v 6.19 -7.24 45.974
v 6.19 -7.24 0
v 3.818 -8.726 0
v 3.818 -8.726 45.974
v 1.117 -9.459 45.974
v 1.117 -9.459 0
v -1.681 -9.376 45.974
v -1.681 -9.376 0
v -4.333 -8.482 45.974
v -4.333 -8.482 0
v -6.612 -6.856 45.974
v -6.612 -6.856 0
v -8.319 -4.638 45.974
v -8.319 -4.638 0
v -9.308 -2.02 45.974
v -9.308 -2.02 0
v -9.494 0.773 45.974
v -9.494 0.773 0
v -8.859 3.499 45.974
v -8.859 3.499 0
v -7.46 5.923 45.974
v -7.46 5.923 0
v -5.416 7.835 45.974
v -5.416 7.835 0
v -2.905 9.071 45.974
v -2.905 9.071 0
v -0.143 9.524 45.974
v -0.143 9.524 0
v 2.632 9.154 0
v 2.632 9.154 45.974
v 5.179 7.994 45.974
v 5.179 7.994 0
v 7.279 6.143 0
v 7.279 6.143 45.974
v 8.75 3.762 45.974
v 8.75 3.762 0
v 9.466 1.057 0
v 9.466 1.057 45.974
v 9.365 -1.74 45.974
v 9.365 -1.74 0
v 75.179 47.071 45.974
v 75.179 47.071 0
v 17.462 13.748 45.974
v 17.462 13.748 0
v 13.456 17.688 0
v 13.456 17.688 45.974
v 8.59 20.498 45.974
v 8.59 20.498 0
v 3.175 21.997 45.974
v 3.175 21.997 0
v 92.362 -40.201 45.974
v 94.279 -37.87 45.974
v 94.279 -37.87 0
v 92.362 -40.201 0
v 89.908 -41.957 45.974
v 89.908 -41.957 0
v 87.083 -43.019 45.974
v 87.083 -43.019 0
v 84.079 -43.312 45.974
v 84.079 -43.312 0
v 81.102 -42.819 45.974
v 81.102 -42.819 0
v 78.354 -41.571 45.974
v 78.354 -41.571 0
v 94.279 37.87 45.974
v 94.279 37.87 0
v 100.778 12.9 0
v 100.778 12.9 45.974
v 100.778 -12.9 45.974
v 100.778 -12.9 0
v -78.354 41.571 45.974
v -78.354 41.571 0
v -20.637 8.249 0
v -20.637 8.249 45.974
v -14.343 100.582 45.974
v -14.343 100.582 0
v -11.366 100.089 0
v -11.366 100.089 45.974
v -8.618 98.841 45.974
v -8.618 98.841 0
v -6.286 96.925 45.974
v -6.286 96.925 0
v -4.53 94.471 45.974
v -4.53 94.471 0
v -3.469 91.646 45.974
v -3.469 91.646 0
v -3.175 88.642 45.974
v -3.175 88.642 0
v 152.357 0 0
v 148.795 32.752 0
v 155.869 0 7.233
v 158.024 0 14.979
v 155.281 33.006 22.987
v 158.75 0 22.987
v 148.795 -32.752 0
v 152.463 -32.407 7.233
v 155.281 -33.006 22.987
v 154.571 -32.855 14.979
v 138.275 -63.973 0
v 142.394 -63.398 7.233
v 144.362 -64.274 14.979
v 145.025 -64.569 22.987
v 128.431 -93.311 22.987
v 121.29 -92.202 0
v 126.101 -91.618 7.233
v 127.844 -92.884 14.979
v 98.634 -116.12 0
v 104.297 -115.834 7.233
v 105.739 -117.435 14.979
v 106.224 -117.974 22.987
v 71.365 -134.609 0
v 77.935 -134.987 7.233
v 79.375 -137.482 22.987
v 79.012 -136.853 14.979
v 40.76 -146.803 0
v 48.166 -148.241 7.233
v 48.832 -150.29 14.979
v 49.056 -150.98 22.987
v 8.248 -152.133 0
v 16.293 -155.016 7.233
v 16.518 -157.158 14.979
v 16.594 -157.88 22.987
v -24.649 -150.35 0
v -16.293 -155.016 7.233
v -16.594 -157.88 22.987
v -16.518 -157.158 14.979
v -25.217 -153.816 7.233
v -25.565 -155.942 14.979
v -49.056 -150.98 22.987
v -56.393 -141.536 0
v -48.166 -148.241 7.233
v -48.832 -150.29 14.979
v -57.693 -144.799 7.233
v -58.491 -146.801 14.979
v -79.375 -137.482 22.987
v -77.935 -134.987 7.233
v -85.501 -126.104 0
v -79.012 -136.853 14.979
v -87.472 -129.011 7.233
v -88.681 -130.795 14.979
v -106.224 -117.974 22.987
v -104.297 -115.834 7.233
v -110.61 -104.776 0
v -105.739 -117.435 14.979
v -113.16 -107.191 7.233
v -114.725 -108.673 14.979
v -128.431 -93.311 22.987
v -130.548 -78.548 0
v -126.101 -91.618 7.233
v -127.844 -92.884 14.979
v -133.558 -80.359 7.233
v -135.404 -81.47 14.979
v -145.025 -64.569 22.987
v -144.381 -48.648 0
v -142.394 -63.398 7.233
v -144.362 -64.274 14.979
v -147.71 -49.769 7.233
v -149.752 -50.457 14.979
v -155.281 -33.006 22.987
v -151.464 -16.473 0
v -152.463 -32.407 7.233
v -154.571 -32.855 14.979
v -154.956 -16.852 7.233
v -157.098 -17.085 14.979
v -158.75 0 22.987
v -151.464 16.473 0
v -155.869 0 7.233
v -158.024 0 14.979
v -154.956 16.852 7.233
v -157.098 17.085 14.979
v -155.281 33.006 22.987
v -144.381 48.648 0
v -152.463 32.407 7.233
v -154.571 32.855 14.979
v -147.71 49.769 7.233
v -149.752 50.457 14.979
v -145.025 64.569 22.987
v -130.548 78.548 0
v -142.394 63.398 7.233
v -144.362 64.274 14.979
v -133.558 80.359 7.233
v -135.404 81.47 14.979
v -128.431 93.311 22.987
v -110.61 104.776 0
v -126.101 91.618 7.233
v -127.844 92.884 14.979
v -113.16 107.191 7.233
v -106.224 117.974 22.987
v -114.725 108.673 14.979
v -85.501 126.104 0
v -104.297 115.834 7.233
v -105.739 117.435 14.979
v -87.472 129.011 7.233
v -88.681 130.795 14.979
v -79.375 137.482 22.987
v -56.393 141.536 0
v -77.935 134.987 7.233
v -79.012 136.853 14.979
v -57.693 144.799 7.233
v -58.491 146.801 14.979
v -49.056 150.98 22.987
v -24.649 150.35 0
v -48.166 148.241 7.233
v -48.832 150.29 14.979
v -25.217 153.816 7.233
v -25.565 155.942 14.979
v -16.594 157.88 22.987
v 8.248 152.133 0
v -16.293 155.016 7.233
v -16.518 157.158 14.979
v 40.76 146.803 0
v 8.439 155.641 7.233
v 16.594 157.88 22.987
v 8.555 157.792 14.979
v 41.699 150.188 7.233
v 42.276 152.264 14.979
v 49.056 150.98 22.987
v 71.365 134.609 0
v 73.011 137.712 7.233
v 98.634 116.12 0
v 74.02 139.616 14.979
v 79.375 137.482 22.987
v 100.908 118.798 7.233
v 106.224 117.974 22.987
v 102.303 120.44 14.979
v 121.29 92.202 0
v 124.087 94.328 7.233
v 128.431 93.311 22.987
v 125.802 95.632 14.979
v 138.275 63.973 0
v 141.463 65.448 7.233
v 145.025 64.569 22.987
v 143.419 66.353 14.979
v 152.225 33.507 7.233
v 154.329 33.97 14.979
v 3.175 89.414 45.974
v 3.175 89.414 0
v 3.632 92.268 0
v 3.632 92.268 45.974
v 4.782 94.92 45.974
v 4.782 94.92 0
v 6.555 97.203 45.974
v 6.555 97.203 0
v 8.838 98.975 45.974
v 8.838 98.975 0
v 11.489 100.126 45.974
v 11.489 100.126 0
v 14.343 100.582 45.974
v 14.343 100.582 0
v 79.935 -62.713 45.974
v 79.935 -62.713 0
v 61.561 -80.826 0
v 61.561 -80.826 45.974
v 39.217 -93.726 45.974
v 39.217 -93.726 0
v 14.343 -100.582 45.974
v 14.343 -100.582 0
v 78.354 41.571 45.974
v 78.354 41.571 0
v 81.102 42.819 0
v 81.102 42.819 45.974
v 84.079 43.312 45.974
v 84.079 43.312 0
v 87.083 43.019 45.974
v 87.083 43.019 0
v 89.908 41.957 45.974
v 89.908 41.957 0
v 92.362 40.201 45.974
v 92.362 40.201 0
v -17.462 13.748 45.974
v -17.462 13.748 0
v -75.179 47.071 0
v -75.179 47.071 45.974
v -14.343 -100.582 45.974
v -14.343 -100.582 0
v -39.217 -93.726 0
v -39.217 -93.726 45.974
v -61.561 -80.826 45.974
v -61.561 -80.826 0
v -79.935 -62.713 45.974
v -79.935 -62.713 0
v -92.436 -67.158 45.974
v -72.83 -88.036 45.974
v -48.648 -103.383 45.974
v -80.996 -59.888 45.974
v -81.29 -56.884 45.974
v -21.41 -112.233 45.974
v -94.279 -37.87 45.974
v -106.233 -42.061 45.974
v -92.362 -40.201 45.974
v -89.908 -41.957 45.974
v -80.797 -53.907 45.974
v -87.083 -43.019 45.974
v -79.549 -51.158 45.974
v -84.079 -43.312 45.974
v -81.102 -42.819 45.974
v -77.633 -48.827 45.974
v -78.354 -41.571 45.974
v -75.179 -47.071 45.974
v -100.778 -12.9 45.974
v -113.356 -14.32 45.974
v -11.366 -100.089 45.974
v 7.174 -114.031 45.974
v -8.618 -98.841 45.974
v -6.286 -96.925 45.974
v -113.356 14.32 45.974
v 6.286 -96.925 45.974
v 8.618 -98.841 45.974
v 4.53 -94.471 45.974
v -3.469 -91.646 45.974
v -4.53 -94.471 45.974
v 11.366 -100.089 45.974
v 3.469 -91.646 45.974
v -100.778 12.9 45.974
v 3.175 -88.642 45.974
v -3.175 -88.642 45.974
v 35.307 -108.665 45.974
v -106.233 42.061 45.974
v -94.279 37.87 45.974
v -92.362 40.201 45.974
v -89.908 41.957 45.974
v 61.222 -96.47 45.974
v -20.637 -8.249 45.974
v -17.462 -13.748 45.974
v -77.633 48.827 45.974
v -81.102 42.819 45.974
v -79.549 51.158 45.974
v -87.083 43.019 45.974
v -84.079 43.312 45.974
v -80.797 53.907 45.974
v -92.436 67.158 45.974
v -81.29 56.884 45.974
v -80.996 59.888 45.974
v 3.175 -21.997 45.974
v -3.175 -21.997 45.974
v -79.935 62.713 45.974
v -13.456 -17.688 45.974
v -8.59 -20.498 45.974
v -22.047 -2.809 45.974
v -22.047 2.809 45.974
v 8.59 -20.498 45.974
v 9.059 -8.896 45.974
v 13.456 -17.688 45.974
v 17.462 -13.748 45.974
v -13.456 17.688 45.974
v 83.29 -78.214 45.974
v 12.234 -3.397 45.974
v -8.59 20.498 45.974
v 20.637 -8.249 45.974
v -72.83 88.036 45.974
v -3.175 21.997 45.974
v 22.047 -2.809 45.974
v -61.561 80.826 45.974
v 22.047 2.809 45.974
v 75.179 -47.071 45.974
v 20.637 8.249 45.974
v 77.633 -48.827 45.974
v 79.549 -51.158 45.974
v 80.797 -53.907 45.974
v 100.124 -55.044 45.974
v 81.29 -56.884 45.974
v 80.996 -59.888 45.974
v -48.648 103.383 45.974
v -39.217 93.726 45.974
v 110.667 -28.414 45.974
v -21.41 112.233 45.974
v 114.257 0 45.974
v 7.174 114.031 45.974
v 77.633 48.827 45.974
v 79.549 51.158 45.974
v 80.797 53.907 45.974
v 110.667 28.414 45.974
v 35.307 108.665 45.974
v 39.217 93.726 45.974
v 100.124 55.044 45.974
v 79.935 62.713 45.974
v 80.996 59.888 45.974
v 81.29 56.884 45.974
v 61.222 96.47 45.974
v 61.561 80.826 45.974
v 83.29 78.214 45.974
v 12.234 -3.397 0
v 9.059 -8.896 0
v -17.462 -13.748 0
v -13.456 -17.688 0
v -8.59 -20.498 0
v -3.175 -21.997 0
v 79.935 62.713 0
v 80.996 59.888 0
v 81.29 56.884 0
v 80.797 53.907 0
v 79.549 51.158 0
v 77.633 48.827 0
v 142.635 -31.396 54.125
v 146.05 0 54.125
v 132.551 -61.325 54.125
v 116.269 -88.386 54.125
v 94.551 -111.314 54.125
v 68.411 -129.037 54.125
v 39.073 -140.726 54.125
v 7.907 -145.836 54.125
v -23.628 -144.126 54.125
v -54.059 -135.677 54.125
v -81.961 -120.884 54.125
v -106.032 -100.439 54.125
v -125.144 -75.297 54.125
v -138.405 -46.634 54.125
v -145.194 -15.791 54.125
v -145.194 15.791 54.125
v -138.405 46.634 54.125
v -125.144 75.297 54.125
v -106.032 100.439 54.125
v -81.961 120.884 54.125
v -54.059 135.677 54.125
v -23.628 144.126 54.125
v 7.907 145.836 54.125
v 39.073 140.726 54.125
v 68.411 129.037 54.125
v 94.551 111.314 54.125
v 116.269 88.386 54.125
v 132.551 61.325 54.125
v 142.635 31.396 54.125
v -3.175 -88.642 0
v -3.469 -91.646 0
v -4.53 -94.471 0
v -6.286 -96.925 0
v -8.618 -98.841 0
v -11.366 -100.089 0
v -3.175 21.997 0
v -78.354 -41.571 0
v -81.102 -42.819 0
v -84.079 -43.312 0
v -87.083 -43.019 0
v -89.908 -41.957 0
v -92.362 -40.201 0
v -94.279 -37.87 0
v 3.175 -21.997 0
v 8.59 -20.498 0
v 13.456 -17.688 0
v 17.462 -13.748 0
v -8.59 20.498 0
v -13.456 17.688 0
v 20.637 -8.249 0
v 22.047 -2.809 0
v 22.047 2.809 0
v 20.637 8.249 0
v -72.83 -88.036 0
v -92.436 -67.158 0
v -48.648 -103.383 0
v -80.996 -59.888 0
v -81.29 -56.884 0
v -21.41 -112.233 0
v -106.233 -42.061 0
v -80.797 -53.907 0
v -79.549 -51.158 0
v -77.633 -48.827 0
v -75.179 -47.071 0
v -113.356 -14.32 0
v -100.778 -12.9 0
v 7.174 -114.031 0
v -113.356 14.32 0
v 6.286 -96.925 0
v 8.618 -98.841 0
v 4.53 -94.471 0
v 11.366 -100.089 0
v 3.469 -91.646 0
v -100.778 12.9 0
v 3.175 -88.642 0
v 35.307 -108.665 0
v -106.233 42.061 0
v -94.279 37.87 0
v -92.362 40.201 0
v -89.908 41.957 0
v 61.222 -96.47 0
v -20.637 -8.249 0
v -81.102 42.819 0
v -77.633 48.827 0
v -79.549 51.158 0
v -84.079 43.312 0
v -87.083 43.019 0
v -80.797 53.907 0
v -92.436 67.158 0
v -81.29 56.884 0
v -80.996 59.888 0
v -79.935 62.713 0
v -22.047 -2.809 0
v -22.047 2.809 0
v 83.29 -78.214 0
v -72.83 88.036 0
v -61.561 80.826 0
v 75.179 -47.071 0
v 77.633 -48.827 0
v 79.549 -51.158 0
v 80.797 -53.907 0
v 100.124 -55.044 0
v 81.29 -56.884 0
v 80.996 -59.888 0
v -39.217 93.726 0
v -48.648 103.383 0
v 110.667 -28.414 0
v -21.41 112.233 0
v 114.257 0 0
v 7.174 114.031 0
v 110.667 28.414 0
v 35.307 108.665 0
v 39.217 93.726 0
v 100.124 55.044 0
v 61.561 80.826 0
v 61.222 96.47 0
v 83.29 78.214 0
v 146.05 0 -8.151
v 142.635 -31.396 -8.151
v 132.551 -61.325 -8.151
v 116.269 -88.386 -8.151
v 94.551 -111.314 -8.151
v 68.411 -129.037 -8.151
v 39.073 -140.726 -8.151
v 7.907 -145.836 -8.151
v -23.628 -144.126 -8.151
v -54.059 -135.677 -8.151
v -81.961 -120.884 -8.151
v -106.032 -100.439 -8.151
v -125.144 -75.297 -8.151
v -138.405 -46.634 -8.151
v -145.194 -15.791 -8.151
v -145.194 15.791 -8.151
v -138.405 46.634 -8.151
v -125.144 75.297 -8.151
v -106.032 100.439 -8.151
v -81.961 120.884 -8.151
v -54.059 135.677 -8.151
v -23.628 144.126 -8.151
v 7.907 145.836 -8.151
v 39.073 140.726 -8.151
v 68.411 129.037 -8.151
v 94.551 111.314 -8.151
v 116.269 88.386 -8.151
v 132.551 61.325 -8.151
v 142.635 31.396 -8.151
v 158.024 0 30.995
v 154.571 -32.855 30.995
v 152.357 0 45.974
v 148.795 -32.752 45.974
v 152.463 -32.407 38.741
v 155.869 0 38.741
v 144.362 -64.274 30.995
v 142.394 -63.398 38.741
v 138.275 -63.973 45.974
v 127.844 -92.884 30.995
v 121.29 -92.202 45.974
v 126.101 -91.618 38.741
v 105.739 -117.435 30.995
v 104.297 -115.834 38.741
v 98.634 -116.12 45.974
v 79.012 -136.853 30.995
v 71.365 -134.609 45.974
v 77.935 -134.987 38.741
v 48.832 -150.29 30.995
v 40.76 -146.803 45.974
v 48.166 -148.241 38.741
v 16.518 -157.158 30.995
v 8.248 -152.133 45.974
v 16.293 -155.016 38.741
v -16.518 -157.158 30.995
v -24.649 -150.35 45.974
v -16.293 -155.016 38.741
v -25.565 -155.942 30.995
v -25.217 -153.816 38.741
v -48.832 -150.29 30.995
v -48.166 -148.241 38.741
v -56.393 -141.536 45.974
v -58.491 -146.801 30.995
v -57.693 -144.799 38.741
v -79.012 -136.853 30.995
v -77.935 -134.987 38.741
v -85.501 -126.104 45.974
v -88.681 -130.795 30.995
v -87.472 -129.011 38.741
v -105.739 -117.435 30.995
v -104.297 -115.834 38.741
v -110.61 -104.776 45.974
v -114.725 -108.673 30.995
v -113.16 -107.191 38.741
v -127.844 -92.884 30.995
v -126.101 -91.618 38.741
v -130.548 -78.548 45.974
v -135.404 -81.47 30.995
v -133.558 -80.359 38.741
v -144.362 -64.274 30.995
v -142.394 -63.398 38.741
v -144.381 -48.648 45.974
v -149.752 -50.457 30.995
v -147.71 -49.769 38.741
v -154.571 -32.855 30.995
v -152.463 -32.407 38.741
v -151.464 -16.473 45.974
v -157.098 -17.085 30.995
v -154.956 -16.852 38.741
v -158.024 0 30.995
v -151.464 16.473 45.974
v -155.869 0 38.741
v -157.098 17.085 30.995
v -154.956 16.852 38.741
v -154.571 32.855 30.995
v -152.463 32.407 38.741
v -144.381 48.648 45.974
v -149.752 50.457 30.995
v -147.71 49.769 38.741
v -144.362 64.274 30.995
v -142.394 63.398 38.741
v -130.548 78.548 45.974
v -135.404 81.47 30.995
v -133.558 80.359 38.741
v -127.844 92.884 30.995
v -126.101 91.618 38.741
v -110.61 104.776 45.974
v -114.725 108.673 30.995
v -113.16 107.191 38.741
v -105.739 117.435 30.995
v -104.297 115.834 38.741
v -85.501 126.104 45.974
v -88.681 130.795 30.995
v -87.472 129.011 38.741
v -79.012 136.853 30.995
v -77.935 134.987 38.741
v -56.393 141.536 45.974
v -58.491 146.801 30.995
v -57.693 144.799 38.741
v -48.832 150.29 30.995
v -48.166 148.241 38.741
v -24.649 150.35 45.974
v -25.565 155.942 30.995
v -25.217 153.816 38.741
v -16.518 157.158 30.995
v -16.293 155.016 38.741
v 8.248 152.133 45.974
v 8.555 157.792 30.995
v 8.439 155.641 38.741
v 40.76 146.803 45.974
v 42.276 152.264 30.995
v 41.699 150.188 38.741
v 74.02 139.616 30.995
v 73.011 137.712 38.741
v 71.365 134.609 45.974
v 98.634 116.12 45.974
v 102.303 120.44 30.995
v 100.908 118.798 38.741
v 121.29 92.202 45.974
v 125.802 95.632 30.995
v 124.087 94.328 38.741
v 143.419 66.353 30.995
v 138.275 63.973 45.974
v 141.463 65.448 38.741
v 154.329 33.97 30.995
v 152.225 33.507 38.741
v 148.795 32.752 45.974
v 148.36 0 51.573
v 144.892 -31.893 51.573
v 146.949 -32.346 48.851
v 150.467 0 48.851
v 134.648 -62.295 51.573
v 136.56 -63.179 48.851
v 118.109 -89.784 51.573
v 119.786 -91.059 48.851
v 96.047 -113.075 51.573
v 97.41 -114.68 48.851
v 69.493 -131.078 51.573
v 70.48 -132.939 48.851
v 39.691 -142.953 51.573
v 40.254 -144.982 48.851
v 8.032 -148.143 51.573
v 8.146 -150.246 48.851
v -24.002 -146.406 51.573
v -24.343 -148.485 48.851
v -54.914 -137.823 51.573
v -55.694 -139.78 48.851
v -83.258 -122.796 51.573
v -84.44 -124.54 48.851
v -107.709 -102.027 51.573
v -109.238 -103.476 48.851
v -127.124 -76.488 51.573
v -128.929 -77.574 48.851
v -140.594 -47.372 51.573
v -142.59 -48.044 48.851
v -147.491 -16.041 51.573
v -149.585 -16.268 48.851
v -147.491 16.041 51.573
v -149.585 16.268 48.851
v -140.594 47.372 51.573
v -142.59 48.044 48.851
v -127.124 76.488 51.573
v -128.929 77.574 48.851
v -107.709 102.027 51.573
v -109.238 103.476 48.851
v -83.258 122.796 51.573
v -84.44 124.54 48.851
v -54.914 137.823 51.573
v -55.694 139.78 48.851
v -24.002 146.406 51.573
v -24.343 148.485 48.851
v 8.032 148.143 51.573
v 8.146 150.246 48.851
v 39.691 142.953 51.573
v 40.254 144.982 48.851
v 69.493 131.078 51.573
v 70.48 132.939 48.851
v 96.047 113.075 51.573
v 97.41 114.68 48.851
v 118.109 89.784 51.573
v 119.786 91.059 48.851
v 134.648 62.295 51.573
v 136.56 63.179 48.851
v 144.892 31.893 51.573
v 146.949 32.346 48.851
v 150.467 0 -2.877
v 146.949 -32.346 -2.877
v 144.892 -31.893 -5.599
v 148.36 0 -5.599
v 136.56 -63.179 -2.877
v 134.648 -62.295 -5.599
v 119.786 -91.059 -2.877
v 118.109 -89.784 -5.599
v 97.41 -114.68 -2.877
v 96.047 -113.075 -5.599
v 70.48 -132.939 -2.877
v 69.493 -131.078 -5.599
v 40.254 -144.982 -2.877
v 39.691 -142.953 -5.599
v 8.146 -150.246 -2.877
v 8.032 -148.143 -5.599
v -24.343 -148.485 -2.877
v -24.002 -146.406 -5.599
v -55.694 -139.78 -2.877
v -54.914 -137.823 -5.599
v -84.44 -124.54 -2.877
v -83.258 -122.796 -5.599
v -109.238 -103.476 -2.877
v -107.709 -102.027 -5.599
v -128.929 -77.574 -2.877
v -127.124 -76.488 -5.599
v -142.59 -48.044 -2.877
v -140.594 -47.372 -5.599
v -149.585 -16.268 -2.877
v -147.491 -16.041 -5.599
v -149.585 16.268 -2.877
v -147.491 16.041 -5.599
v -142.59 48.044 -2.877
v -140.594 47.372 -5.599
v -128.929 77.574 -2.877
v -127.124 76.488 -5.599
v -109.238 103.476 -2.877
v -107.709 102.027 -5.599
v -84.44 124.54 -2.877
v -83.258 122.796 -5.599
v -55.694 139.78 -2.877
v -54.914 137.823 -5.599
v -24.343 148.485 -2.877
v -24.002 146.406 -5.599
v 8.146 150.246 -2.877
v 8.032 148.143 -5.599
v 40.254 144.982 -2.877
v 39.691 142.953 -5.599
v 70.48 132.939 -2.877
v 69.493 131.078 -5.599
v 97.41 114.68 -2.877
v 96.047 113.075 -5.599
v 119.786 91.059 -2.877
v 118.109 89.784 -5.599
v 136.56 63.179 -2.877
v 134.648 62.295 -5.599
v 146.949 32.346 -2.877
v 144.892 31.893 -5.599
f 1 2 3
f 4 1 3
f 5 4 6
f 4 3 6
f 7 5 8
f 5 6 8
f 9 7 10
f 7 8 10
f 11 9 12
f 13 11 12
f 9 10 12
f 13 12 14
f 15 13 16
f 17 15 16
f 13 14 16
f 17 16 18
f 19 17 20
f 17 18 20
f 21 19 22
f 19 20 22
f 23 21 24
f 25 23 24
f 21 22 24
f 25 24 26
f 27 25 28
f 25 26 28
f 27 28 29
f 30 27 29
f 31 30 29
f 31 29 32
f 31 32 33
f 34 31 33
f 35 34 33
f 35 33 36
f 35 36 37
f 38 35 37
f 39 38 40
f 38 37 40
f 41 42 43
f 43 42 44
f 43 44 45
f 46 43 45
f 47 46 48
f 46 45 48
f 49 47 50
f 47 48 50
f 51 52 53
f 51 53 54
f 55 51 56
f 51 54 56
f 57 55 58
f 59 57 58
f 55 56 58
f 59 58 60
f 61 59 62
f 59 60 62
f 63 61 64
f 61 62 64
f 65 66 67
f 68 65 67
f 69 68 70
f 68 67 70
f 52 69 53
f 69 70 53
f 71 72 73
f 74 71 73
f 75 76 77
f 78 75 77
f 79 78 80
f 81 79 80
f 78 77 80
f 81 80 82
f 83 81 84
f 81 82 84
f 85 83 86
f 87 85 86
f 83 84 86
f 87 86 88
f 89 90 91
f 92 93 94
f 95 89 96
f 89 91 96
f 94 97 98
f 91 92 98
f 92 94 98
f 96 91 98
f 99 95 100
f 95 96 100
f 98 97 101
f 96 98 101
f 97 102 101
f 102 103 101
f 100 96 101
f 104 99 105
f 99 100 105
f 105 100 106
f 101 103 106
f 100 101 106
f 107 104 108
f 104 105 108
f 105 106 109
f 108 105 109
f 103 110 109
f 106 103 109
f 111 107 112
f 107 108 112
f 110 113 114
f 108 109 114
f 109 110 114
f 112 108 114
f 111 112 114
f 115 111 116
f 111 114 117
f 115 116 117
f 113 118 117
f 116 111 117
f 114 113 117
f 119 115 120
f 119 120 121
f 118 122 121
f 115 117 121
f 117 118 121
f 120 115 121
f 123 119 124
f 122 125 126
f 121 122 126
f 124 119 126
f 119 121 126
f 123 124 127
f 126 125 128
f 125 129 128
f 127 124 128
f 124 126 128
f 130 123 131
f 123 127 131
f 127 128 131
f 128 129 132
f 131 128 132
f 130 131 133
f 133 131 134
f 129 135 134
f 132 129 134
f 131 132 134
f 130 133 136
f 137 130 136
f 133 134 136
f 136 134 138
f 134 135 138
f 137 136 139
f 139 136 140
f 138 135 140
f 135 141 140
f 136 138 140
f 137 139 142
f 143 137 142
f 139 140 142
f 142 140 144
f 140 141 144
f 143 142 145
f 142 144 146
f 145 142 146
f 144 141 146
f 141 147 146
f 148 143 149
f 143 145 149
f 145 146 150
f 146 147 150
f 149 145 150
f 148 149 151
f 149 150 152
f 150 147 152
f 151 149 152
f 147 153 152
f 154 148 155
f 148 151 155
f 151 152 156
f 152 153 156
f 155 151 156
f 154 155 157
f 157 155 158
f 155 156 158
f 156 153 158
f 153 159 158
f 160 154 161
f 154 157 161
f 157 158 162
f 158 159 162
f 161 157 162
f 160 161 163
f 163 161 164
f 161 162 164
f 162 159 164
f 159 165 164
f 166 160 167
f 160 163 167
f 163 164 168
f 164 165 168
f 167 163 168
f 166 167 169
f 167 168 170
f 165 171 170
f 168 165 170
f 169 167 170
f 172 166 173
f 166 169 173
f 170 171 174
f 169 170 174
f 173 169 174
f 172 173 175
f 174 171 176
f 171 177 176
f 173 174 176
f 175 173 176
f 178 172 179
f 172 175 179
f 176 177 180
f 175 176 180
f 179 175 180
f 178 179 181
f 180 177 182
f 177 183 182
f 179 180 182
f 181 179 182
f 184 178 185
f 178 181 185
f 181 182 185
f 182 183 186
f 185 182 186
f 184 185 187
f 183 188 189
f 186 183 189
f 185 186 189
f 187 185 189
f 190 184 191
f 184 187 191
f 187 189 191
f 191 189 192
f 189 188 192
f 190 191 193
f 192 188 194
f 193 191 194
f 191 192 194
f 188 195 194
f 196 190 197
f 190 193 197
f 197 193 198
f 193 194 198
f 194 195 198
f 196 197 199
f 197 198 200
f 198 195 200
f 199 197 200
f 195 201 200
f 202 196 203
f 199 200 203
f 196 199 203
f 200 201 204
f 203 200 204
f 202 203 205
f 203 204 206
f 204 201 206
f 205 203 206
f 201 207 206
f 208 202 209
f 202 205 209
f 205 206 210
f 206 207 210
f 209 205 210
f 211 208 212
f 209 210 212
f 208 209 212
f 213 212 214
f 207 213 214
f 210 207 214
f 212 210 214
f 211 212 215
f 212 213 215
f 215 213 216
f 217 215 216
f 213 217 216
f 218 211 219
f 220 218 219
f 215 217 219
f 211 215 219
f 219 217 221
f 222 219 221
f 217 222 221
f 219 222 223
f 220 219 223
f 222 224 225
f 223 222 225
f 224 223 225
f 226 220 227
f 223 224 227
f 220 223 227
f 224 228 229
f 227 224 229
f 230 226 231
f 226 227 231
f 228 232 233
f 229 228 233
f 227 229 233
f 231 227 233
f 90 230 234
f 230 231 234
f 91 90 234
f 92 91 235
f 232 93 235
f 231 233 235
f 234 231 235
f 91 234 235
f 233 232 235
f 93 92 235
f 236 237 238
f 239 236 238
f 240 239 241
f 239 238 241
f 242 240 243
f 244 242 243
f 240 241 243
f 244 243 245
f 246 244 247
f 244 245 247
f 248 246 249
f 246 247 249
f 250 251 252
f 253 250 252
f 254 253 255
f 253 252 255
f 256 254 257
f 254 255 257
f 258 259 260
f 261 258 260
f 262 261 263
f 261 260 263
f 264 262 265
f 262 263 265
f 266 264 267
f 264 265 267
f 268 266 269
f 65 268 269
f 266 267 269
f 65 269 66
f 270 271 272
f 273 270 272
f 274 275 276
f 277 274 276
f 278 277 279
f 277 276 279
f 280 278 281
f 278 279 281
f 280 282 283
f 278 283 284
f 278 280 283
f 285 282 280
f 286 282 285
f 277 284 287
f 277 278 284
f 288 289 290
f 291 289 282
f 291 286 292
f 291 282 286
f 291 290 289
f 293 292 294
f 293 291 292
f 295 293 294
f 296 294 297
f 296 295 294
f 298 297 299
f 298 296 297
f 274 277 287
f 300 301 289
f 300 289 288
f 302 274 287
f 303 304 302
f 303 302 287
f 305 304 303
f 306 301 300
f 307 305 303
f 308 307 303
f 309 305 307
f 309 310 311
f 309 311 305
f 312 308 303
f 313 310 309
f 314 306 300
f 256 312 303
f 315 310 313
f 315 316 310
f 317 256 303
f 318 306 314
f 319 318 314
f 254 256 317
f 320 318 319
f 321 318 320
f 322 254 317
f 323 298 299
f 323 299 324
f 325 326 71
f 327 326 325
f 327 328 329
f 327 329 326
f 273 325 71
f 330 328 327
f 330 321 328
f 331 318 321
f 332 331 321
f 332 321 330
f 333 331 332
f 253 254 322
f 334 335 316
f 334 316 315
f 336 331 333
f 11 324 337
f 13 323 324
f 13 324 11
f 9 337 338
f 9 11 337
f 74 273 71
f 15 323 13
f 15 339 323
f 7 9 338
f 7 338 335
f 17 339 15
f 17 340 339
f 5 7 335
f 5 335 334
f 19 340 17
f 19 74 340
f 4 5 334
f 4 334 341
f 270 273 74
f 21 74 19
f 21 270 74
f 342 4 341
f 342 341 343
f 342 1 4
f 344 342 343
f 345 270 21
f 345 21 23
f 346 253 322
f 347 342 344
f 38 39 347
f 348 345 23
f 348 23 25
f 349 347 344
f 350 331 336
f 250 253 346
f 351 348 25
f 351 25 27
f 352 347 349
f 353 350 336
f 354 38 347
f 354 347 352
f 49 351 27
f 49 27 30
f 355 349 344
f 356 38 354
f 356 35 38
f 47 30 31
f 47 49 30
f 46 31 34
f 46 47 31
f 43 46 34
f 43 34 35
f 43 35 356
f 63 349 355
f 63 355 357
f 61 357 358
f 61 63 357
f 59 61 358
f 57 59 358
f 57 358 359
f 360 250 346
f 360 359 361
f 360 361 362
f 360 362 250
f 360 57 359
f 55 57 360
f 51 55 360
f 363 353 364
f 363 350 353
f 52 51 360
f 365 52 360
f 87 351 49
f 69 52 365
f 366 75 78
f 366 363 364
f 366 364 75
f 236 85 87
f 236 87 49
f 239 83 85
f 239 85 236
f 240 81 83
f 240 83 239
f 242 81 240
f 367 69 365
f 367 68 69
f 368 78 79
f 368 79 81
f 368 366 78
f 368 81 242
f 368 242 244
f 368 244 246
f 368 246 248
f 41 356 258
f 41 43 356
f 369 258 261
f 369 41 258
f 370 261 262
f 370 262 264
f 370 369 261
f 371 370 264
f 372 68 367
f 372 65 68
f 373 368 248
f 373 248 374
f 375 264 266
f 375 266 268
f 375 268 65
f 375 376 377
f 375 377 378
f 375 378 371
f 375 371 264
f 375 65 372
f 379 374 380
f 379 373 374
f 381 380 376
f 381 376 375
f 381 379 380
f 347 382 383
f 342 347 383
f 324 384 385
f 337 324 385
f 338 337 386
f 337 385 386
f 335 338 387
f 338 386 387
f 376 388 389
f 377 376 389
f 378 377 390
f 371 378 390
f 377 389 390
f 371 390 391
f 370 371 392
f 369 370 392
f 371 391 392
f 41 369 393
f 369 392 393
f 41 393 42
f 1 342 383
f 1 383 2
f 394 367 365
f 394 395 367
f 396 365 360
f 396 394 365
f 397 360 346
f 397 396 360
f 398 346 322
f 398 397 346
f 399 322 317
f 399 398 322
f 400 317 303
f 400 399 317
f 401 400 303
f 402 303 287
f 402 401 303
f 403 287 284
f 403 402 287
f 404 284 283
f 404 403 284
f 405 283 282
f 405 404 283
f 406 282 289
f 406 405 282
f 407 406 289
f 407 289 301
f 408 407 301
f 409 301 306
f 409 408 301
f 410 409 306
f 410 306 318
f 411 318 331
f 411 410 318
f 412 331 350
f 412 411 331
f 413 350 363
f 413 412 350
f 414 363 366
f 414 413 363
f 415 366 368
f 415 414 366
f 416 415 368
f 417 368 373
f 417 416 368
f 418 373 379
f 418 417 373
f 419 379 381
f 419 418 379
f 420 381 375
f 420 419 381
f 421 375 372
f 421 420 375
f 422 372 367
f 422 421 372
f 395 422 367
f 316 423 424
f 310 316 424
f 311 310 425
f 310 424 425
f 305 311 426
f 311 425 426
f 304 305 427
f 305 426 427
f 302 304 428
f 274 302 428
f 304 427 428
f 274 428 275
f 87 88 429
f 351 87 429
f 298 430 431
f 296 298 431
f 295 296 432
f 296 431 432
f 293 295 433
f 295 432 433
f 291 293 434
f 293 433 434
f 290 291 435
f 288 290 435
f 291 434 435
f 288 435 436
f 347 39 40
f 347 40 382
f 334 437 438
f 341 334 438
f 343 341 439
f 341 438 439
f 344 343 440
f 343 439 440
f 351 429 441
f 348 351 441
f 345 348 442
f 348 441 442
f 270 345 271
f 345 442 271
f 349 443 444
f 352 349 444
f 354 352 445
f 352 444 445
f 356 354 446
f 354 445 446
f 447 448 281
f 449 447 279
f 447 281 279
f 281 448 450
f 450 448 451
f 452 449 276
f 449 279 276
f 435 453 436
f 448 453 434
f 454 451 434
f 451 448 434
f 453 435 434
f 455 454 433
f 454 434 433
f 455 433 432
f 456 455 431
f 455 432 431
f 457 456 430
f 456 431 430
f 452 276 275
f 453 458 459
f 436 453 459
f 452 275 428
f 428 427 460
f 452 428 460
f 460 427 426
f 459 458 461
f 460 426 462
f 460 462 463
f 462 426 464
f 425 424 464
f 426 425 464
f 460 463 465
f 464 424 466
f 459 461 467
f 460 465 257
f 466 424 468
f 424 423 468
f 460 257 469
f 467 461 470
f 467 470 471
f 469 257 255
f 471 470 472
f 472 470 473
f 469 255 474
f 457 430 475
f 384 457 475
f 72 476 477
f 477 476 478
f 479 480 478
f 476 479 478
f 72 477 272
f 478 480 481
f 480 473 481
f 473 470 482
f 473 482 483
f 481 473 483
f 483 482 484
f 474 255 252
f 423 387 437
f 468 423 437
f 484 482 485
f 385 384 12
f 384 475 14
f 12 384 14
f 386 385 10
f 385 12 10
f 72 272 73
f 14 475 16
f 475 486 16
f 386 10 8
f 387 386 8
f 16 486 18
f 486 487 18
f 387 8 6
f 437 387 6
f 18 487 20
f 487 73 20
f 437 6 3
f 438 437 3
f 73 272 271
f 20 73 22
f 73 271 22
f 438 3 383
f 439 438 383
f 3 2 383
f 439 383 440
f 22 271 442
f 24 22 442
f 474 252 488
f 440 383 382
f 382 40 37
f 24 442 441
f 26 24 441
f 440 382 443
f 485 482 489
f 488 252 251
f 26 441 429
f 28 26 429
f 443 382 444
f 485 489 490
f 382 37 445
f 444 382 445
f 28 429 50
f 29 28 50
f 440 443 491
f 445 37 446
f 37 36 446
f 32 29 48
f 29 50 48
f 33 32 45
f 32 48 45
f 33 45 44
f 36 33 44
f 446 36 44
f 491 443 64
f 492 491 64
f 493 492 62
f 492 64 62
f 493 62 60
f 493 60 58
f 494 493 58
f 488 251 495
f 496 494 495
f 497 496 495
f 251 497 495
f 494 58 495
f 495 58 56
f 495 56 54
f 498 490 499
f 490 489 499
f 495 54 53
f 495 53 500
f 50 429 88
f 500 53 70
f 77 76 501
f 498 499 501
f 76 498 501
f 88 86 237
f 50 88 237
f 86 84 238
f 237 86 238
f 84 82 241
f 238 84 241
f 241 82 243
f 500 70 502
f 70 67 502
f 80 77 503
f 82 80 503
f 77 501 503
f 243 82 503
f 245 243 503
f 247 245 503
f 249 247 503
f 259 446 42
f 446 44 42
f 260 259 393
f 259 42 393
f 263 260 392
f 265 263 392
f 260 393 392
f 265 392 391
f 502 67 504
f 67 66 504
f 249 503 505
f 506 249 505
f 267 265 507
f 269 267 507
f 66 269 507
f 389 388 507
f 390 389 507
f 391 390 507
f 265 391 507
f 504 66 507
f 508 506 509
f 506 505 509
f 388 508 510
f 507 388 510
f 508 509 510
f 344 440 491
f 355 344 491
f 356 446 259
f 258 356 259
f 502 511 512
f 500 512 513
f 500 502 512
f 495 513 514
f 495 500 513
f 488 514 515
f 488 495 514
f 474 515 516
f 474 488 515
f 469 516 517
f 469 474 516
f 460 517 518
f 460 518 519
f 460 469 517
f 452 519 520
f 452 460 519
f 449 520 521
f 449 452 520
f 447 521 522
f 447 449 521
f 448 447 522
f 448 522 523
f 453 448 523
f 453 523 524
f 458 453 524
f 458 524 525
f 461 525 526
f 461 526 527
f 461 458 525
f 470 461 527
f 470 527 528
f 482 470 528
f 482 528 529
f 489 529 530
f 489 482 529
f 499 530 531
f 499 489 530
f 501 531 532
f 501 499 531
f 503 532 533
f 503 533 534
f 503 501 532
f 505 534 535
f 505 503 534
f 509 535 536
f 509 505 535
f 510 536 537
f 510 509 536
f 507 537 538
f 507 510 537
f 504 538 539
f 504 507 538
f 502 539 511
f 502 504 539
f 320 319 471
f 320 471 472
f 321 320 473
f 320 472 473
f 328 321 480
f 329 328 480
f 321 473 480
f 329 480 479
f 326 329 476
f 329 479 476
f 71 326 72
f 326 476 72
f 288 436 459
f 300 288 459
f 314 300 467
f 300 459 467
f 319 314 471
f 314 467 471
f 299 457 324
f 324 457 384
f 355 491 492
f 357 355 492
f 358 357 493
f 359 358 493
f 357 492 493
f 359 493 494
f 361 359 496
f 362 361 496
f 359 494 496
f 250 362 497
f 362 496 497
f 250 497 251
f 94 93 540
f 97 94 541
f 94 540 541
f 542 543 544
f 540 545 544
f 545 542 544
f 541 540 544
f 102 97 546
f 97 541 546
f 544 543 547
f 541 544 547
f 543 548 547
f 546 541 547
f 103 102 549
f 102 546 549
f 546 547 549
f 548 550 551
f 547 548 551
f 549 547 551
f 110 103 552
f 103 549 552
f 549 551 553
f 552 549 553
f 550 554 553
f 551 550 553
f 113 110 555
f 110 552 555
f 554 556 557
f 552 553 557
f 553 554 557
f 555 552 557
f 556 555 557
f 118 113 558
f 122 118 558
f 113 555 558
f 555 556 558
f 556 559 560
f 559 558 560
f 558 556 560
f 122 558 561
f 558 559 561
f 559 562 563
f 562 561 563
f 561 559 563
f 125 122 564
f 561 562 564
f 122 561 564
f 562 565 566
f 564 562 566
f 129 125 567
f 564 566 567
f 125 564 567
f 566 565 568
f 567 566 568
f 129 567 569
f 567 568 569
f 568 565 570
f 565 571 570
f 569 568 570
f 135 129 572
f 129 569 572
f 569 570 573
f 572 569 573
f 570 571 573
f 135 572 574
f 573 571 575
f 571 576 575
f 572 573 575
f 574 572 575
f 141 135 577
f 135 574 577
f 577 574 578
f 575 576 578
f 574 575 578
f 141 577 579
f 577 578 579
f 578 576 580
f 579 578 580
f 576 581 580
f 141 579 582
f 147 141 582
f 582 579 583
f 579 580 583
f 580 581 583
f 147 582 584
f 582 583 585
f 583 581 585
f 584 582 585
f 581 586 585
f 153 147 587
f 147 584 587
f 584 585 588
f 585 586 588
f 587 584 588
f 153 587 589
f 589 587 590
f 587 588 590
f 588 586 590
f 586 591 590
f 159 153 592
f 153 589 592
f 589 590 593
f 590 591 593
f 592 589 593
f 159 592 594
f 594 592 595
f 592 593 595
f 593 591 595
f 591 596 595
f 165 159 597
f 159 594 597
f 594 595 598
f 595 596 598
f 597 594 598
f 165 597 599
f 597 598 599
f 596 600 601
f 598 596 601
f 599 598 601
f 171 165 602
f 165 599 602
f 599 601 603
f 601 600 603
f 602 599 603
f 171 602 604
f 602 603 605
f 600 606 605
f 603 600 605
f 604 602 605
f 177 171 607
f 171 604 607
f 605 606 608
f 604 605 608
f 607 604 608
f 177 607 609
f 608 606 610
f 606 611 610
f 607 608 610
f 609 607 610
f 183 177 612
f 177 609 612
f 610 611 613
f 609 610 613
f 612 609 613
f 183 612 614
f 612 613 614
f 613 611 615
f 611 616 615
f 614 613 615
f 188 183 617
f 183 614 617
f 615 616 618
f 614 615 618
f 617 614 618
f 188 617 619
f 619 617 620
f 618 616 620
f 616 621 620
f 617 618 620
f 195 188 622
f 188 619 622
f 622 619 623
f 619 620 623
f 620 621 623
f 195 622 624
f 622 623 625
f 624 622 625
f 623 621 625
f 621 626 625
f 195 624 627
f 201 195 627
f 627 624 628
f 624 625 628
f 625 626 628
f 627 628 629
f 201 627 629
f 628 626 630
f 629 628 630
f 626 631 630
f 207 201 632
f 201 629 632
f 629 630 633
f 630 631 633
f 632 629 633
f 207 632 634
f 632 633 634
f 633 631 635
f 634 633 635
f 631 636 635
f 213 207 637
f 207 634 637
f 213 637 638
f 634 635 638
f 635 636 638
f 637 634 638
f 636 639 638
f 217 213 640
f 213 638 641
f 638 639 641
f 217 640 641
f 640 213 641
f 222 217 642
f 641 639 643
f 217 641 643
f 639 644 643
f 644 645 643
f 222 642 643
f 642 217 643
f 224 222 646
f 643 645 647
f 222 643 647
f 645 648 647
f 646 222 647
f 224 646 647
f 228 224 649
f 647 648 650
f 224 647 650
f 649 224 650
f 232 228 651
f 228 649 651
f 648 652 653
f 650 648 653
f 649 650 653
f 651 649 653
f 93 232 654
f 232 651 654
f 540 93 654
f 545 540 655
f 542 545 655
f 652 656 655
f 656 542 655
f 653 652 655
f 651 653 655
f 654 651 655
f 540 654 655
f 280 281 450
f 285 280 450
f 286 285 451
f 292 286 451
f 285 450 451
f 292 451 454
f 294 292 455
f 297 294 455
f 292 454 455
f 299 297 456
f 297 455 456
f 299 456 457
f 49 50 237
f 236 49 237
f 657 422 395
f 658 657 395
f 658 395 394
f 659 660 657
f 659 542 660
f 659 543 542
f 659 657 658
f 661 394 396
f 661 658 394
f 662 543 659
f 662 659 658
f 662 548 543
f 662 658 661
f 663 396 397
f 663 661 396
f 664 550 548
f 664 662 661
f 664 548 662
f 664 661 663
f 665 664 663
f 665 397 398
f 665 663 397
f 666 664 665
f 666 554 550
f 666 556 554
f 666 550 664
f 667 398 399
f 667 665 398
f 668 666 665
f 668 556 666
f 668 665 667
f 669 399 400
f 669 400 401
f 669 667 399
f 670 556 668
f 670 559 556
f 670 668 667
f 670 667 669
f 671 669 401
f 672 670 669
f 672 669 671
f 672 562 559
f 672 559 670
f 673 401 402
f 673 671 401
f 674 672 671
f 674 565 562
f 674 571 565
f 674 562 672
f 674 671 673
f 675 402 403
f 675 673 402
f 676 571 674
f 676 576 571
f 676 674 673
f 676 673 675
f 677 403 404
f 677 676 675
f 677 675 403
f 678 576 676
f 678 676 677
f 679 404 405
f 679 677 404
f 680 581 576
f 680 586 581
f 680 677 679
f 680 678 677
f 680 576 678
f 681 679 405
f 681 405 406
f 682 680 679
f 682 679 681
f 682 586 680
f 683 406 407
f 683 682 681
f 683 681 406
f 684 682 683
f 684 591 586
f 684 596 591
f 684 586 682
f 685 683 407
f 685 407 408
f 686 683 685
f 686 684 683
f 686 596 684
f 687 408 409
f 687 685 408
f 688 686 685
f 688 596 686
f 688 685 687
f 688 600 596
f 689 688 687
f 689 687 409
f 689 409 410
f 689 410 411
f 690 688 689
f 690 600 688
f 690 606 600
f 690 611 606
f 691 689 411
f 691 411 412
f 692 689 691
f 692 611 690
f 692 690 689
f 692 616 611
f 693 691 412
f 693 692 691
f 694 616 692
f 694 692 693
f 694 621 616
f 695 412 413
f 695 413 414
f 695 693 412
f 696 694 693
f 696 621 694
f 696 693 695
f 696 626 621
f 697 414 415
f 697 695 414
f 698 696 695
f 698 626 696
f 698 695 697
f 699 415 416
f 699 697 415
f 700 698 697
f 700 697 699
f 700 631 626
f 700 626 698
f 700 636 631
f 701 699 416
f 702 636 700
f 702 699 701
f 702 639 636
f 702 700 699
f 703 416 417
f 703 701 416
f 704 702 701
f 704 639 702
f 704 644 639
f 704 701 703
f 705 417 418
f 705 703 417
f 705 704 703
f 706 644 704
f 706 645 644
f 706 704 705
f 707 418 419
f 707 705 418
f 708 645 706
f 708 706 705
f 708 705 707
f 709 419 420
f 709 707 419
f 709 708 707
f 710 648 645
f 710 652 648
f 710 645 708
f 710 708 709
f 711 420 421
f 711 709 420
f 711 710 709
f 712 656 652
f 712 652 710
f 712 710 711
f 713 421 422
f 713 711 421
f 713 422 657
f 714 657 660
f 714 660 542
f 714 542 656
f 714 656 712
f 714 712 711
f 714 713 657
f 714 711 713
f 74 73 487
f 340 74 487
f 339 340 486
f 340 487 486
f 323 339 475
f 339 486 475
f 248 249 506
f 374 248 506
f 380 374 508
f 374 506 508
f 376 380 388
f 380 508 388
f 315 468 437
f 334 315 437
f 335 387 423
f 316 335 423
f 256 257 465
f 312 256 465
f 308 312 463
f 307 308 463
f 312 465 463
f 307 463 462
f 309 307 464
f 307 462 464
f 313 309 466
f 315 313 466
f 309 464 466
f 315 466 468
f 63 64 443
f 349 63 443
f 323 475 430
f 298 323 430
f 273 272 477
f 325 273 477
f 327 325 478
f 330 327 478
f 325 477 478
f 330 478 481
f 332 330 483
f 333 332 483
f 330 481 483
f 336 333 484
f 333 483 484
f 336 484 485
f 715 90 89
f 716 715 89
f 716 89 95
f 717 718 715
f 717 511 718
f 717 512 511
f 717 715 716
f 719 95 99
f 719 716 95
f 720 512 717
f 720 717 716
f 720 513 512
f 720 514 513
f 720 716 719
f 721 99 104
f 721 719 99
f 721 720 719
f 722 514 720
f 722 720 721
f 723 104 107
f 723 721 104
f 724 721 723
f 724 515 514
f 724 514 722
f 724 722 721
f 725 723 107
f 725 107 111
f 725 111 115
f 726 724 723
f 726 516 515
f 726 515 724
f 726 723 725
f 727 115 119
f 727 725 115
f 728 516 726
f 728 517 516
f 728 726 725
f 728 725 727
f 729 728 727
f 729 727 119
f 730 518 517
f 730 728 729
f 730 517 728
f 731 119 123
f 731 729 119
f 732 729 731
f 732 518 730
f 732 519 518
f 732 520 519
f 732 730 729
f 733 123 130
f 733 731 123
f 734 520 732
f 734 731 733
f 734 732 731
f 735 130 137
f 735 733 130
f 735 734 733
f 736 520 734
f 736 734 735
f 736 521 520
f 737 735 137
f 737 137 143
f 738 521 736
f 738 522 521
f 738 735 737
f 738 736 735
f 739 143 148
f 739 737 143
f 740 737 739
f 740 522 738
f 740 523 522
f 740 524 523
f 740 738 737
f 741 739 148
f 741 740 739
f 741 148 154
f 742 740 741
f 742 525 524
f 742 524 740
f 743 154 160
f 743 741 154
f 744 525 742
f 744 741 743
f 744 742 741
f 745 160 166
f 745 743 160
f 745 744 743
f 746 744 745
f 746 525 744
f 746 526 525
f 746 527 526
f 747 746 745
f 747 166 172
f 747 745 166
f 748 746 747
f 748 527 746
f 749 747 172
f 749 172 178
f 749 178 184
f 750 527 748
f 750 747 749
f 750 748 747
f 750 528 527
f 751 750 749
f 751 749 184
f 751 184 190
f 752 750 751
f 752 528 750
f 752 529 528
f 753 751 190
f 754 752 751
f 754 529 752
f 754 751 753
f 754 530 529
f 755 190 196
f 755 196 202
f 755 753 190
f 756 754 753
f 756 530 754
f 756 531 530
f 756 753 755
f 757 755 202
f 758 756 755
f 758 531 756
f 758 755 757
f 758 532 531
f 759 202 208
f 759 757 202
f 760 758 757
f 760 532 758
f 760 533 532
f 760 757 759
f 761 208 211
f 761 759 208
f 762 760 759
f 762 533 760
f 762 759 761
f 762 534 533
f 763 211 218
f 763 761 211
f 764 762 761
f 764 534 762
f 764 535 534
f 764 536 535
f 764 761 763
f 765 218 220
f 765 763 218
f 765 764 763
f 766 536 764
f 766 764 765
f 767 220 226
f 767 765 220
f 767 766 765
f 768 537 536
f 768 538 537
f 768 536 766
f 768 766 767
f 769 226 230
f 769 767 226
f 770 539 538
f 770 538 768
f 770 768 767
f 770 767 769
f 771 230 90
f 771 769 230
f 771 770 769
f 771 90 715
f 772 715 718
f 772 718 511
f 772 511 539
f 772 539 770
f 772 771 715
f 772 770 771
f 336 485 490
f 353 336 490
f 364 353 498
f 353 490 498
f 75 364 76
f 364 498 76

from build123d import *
from build123d.topology import SkipClean

# Parameters (mm, degrees)
SKETCH1_R           = 158.75
BOSS_EXTRUDE1_DEPTH = 45.974


with BuildPart() as part:
    # Sketch1 → Boss-Extrude1 (new body)
    with BuildSketch(Plane.XY):
        Circle(SKETCH1_R)
        with BuildLine():
            Line((-3.175, 88.6419075), (-3.175, 21.997045256))
            ThreePointArc((-3.175, 21.997045256), (-11.1125, 19.247414599), (-17.4625, 13.748153285))
            Line((-17.4625, 13.748153285), (-75.178643735, 47.070584407))
            ThreePointArc((-75.178643735, 47.070584407), (-80.796594988, 53.906629613), (-79.935272493, 62.712934961))
            ThreePointArc((-79.935272493, 62.712934961), (-50.8, 87.988181024), (-14.343358575, 100.582444118))
            ThreePointArc((-14.343358575, 100.582444118), (-6.286213183, 96.925218605), (-3.175, 88.6419075))
        make_face(mode=Mode.SUBTRACT)
        with BuildLine():
            ThreePointArc((14.343358575, 100.582444118), (50.8, 87.988181024), (79.935272493, 62.712934961))
            ThreePointArc((79.935272493, 62.712934961), (80.796594988, 53.906629613), (75.178643735, 47.070584407))
            Line((75.178643735, 47.070584407), (17.4625, 13.748153285))
            ThreePointArc((17.4625, 13.748153285), (11.1125, 19.247414599), (3.175, 21.997045256))
            Line((3.175, 21.997045256), (3.175, 88.6419075))
            ThreePointArc((3.175, 88.6419075), (6.286213183, 96.925218605), (14.343358575, 100.582444118))
        make_face(mode=Mode.SUBTRACT)
        with BuildLine():
            ThreePointArc((-94.278631069, -37.869509157), (-101.6, 0), (-94.278631069, 37.869509157))
            ThreePointArc((-94.278631069, 37.869509157), (-87.082808171, 43.018588992), (-78.353643735, 41.571323093))
            Line((-78.353643735, 41.571323093), (-20.6375, 8.248891971))
            ThreePointArc((-20.6375, 8.248891971), (-22.225, 0), (-20.6375, -8.248891971))
            Line((-20.6375, -8.248891971), (-78.353643735, -41.571323093))
            ThreePointArc((-78.353643735, -41.571323093), (-87.082808171, -43.018588992), (-94.278631069, -37.869509157))
        make_face(mode=Mode.SUBTRACT)
        with BuildLine():
            ThreePointArc((-14.343358575, -100.582444118), (-50.8, -87.988181024), (-79.935272493, -62.712934961))
            ThreePointArc((-79.935272493, -62.712934961), (-80.796594988, -53.906629613), (-75.178643735, -47.070584407))
            Line((-75.178643735, -47.070584407), (-17.4625, -13.748153285))
            ThreePointArc((-17.4625, -13.748153285), (-11.1125, -19.247414599), (-3.175, -21.997045256))
            Line((-3.175, -21.997045256), (-3.175, -88.6419075))
            ThreePointArc((-3.175, -88.6419075), (-6.286213183, -96.925218605), (-14.343358575, -100.582444118))
        make_face(mode=Mode.SUBTRACT)
        with BuildLine():
            ThreePointArc((79.935272493, -62.712934961), (50.8, -87.988181024), (14.343358575, -100.582444118))
            ThreePointArc((14.343358575, -100.582444118), (6.286213183, -96.925218605), (3.175, -88.6419075))
            Line((3.175, -88.6419075), (3.175, -21.997045256))
            ThreePointArc((3.175, -21.997045256), (11.1125, -19.247414599), (17.4625, -13.748153285))
            Line((17.4625, -13.748153285), (75.178643735, -47.070584407))
            ThreePointArc((75.178643735, -47.070584407), (80.796594988, -53.906629613), (79.935272493, -62.712934961))
        make_face(mode=Mode.SUBTRACT)
        with BuildLine():
            ThreePointArc((94.278631069, -37.869509157), (87.082808171, -43.018588992), (78.353643735, -41.571323093))
            Line((78.353643735, -41.571323093), (20.6375, -8.248891971))
            ThreePointArc((20.6375, -8.248891971), (22.225, 0), (20.6375, 8.248891971))
            Line((20.6375, 8.248891971), (78.353643735, 41.571323093))
            ThreePointArc((78.353643735, 41.571323093), (87.082808171, 43.018588992), (94.278631069, 37.869509157))
            ThreePointArc((94.278631069, 37.869509157), (101.6, 0), (94.278631069, -37.869509157))
        make_face(mode=Mode.SUBTRACT)
        with BuildLine():
            Line((9.059069904, -8.896430657), (6.189629933, -7.239758718))
            ThreePointArc((6.189629933, -7.239758718), (-8.248891971, 4.7625), (9.364629933, -1.740497404))
            Line((9.364629933, -1.740497404), (12.234069904, -3.397169343))
            Line((12.234069904, -3.397169343), (9.059069904, -8.896430657))
        make_face(mode=Mode.SUBTRACT)
    extrude(amount=BOSS_EXTRUDE1_DEPTH)

    # Sketch2 → Cut-Revolve1 (revolve, cut)
    with BuildSketch(Plane(origin=(0, 0, 0), x_dir=(1, 0, 0), z_dir=(0, 1, 0))):
        with BuildLine():
            Line((158.75, -45.974), (158.75, -22.987))
            ThreePointArc((158.75, -22.987), (157.121901144, -34.91676007), (152.356680652, -45.974))
            Line((152.356680652, -45.974), (158.75, -45.974))
        make_face()
        with BuildLine():
            Line((158.75, 0), (152.356680652, 0))
            ThreePointArc((152.356680652, 0), (157.121901144, -11.05723993), (158.75, -22.987))
            Line((158.75, -22.987), (158.75, 0))
        make_face()
    revolve(axis=Axis((0, 0, 0), (0, 0, -1)), mode=Mode.SUBTRACT)

    # Sketch2<6> → Revolve2 (revolve)
    with SkipClean():  # the faces are left unmerged after this step: merging them gives an invalid solid
        with BuildSketch(Plane(origin=(0, 0, 0), x_dir=(1, 0, 0), z_dir=(0, 1, 0))):
            with BuildLine():
                ThreePointArc((152.356680652, 0), (149.439969417, 4.258386632), (146.05, 8.150579906))
                Line((146.05, 8.150579906), (114.256680652, 0))
                Line((114.256680652, 0), (152.356680652, 0))
            make_face()
            with BuildLine():
                ThreePointArc((146.05, -54.124579906), (149.439969417, -50.232386632), (152.356680652, -45.974))
                Line((152.356680652, -45.974), (114.256680652, -45.974))
                Line((114.256680652, -45.974), (146.05, -54.124579906))
            make_face()
        revolve(axis=Axis((0, 0, 0), (0, 0, -1)))


solid = part.part
